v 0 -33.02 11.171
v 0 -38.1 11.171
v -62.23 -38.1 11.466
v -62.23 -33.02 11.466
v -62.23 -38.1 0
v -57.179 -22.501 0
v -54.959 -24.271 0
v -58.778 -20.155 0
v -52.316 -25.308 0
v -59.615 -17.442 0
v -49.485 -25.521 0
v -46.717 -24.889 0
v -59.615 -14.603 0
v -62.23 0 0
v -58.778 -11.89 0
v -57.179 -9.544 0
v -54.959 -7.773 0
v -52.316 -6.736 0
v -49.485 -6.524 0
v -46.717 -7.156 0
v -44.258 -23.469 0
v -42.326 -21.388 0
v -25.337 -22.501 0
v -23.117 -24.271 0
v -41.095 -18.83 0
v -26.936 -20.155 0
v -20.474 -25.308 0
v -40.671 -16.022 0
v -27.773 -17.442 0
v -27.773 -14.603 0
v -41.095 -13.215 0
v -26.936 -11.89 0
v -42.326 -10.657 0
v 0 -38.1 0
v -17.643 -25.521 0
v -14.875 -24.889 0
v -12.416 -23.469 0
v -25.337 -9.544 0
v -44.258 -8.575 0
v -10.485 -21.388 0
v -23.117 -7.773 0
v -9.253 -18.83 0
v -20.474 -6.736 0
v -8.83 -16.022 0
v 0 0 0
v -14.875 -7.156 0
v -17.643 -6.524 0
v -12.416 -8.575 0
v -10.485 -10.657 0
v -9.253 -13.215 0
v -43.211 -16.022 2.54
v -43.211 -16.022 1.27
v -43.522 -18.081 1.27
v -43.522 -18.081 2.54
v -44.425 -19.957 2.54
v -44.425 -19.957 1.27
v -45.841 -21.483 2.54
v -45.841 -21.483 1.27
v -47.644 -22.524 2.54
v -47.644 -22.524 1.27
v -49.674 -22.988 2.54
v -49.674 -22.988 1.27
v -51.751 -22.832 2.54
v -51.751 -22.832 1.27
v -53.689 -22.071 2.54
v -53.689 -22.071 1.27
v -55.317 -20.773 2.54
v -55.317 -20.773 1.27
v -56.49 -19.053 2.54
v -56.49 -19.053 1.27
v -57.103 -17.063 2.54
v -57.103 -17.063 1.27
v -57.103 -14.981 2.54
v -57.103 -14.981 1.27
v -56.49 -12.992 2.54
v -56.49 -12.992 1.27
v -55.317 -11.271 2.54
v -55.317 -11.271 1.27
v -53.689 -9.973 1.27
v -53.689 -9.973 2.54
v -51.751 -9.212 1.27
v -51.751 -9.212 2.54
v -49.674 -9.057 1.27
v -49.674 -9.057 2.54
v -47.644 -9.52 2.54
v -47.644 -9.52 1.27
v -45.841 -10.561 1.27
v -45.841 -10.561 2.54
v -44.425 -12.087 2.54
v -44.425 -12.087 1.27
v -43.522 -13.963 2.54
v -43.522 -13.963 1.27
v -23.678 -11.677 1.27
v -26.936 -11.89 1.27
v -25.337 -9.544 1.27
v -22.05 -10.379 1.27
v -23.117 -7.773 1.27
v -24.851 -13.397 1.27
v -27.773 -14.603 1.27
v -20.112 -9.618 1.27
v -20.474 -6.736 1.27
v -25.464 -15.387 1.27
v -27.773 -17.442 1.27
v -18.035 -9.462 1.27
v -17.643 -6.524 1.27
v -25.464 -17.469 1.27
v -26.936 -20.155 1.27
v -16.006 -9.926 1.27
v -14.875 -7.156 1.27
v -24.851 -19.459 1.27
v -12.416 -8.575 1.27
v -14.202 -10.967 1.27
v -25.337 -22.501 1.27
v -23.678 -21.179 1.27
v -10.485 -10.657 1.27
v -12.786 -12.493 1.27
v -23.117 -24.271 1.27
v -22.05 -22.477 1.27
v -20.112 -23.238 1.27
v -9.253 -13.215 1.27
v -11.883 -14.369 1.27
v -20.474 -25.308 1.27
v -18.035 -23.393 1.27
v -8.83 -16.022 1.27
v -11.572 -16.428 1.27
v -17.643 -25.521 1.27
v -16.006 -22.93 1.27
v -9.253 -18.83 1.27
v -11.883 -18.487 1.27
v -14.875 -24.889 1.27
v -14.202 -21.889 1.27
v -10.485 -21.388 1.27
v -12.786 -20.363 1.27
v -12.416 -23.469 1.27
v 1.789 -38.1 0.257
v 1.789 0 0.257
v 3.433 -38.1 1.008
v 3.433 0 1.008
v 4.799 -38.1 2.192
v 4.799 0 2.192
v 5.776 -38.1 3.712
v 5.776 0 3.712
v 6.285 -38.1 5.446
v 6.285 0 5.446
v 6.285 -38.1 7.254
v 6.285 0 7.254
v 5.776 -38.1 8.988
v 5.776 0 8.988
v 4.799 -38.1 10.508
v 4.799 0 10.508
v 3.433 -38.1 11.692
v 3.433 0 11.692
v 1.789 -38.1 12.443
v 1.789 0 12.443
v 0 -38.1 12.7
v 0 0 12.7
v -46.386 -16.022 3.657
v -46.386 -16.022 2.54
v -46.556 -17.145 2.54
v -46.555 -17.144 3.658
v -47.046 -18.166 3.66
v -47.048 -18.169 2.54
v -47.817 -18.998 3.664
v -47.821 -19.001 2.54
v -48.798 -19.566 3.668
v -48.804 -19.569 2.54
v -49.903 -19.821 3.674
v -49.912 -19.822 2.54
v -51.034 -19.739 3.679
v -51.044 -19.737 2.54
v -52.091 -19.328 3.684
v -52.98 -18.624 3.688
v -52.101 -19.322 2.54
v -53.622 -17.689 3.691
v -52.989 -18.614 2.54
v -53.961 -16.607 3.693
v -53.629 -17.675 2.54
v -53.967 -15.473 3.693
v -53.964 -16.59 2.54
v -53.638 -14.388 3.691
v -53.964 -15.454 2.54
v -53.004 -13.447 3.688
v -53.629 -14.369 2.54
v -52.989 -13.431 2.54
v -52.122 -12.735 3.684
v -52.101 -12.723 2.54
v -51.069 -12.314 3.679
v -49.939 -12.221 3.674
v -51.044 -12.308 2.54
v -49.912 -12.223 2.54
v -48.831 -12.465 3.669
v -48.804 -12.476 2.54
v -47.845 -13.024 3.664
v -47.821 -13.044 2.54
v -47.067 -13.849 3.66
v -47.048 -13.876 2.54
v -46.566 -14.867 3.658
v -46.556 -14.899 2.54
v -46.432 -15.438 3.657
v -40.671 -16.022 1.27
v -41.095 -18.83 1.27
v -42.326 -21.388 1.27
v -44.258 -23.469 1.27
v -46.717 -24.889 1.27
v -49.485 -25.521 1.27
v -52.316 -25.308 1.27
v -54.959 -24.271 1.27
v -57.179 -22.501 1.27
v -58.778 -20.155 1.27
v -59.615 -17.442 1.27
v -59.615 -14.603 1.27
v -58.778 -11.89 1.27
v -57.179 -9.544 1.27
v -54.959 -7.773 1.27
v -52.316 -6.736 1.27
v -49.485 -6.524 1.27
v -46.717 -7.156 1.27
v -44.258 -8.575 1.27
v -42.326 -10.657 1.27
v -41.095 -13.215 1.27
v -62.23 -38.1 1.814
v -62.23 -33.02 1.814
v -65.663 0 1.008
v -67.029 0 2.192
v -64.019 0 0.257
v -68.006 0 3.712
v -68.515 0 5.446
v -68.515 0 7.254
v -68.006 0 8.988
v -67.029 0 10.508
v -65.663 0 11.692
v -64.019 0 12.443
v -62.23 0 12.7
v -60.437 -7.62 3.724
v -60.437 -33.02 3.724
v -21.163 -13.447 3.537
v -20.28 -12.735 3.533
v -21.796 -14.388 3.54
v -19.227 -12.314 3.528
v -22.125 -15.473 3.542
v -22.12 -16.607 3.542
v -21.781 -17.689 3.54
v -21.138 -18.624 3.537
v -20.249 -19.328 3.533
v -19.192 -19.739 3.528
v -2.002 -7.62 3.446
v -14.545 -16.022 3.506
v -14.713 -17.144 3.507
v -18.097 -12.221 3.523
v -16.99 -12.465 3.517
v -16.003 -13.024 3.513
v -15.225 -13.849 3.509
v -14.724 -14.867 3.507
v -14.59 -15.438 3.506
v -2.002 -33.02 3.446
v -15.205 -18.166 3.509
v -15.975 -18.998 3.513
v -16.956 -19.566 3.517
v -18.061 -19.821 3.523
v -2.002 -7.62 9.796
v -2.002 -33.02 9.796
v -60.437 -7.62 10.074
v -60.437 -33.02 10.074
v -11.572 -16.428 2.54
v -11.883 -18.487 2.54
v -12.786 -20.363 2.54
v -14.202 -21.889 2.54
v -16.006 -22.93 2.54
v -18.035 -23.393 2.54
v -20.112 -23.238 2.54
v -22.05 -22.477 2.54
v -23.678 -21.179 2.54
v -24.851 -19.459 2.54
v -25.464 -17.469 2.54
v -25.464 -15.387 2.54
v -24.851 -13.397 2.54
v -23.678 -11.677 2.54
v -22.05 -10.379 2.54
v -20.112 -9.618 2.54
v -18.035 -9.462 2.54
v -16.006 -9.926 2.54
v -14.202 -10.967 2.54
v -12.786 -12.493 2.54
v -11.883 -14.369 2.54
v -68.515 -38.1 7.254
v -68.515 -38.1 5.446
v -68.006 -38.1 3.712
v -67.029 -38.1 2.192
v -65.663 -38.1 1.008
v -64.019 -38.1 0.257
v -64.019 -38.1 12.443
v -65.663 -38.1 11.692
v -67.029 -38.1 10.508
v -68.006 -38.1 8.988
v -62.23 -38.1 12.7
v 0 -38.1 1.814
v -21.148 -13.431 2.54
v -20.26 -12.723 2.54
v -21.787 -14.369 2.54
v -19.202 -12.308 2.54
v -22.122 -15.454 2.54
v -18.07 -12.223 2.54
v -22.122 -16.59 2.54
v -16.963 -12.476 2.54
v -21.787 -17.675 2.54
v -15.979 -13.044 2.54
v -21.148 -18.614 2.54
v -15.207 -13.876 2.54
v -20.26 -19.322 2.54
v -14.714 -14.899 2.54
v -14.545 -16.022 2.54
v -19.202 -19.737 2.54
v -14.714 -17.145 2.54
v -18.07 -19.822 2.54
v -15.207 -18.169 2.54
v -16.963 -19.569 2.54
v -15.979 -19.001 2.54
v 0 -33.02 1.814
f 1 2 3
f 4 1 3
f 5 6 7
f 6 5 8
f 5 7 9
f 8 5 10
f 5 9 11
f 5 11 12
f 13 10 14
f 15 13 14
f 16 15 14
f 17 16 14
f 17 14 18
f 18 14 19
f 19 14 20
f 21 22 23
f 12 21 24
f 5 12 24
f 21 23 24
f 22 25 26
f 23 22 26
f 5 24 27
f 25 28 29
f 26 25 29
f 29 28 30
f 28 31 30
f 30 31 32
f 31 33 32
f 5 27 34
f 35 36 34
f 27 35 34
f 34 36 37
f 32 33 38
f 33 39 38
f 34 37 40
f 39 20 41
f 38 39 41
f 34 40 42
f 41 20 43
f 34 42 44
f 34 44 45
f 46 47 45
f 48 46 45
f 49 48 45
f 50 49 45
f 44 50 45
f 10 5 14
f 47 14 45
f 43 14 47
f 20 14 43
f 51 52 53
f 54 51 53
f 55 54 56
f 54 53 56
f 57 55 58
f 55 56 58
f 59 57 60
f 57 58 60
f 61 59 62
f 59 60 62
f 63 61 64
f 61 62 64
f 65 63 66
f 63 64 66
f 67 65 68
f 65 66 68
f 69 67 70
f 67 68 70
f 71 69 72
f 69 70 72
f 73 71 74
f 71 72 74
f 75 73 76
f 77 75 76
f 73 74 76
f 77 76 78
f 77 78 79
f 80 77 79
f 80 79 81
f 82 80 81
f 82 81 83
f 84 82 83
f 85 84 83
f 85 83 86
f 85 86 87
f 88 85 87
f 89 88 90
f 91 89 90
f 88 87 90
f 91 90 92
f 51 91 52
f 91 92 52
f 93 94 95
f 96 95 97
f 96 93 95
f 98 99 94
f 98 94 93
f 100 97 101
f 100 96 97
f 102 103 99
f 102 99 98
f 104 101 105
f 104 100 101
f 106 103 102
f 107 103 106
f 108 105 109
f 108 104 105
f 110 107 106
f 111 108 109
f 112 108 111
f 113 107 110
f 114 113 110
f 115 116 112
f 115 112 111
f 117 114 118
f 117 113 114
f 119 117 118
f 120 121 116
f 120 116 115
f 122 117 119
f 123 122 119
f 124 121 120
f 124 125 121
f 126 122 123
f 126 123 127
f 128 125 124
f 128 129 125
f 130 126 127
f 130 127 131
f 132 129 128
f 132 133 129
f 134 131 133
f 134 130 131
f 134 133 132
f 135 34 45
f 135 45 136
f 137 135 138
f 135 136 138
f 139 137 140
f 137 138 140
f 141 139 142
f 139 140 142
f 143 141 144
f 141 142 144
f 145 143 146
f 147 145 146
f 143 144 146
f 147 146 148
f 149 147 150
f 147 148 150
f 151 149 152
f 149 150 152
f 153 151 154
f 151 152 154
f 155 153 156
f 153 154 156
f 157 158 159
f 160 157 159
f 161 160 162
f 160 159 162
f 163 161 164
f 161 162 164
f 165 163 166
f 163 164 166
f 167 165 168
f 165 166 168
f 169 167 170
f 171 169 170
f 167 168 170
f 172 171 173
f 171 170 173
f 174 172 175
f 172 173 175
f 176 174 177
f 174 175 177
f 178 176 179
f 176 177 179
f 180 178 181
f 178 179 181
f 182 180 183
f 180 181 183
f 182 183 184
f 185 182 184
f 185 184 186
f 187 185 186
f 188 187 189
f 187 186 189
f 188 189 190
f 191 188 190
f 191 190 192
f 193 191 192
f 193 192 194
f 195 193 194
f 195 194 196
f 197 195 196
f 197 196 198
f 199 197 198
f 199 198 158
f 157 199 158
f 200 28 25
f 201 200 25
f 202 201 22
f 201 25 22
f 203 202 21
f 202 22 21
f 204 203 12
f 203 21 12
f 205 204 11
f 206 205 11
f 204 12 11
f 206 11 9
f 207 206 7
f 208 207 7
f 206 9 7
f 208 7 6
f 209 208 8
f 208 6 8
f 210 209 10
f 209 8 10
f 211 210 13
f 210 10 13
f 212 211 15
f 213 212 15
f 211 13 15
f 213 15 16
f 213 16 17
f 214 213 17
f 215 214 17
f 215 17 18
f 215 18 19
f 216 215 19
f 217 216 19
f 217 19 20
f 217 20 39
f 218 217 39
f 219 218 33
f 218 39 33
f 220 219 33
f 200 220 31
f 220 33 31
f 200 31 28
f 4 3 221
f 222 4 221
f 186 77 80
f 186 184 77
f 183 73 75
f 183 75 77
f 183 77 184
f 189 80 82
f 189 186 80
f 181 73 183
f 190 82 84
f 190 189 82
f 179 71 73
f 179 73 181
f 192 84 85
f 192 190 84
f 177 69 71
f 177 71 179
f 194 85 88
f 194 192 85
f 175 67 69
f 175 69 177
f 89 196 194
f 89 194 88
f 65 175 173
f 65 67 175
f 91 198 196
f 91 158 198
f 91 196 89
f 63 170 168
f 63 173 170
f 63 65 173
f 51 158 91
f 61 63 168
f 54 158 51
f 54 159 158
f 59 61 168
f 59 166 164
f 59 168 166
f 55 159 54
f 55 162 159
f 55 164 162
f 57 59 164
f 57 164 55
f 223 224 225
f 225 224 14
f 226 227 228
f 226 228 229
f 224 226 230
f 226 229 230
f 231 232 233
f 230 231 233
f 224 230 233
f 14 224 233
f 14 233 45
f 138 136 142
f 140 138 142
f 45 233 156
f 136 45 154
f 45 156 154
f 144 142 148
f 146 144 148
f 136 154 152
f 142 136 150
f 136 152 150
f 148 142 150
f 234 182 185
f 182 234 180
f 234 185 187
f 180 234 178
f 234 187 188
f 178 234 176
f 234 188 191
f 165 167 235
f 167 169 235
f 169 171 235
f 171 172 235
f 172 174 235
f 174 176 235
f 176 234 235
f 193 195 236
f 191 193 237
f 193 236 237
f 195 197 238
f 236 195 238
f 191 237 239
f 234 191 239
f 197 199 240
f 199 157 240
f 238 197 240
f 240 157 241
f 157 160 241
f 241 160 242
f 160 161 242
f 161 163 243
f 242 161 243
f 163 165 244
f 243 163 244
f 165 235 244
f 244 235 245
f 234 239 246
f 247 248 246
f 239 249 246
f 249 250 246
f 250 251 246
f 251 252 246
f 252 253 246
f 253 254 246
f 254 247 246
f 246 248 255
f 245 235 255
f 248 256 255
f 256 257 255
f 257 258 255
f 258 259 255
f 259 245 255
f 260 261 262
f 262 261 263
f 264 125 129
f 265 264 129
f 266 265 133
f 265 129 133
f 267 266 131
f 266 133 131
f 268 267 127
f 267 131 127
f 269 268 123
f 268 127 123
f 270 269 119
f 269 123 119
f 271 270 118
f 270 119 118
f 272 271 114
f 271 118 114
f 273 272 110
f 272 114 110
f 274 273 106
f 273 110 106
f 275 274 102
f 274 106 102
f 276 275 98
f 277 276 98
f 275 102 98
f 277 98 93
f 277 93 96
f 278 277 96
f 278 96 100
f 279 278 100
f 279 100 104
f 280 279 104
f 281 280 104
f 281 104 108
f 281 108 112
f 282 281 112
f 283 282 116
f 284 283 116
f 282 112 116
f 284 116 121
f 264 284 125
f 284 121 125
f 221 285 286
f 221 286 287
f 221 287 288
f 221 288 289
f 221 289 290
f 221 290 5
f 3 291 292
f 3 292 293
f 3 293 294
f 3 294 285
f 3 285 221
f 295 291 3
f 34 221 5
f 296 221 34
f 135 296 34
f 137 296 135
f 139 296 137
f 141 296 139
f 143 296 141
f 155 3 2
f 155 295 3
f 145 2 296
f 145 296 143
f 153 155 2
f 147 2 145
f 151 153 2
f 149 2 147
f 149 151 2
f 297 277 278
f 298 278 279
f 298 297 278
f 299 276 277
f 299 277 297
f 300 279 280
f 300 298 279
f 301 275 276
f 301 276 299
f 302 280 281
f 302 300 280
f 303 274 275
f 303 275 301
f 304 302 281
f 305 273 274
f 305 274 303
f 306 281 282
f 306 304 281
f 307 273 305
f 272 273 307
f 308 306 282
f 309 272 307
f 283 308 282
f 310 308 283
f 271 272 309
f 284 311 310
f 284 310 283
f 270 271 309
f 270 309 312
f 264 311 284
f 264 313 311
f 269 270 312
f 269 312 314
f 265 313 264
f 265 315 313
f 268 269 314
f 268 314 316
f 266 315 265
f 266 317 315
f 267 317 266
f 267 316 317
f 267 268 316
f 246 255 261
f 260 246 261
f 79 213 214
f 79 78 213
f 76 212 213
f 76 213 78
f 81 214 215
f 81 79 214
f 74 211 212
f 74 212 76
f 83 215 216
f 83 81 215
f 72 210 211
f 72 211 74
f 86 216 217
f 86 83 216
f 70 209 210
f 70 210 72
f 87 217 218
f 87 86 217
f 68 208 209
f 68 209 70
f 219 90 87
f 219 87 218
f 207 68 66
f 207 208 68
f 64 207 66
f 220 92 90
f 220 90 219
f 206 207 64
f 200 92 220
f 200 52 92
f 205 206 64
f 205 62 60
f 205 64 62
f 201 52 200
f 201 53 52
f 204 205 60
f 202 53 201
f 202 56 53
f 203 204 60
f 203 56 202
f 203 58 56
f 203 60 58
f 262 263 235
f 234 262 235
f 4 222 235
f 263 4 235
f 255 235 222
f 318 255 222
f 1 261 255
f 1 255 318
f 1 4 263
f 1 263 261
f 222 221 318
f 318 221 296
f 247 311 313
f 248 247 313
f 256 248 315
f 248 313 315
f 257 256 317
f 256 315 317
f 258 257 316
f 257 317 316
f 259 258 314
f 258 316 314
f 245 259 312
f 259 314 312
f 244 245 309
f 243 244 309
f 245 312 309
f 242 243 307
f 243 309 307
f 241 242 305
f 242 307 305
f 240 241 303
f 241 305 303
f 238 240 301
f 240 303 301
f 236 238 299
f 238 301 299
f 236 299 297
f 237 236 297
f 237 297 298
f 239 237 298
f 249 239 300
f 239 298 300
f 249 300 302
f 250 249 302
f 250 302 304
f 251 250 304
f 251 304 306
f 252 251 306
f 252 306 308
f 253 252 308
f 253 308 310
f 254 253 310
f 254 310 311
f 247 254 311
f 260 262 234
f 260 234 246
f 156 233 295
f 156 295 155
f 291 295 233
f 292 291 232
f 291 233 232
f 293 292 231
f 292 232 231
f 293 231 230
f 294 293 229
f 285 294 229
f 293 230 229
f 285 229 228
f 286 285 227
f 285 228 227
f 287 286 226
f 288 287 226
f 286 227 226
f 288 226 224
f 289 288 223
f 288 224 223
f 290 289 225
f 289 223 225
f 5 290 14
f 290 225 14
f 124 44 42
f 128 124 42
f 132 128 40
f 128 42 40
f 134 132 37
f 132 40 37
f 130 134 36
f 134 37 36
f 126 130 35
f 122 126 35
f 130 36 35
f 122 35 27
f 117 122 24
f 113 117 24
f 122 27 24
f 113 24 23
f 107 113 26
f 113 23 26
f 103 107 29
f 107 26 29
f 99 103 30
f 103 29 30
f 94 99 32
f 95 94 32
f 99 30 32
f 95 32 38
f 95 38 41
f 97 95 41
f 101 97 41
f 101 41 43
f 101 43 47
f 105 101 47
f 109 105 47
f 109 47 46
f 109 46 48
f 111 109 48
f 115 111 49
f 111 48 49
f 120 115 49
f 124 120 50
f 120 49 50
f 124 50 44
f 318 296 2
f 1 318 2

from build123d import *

# Parameters (mm, degrees)
F0_W      = 62.23
F0_H      = 12.7
F1_DEPTH  = 38.1
F3_DEPTH  = 5.08
F5_DEPTH  = 25.4
F6_R      = 9.525
F7_DEPTH  = 1.27
F8_R      = 6.985
F9_DEPTH  = 1.27
F10_R     = 3.81
F11_DEPTH = 1.27


with BuildPart() as f1:
    # F0 (on Front) → F1 (new body)
    with BuildSketch(Plane.XZ):
        with Locations((-31.115, 6.35)):
            Rectangle(F0_W, F0_H)
        with BuildLine():
            Line((0, 12.7), (0, 0))
            ThreePointArc((0, 0), (6.35, 6.35), (0, 12.7))
        make_face()
        with BuildLine():
            ThreePointArc((-62.23, 12.7), (-68.58, 6.35), (-62.23, 0))
            Line((-62.23, 0), (-62.23, 12.7))
        make_face()
    extrude(amount=F1_DEPTH)

    # F2 (on face) → F3 (cut)
    with BuildSketch(Plane.XZ.offset(38.1)):
        Polygon((-62.23, 1.814069), (0, 1.814069), (0, 11.170847), (-62.23, 11.466069), align=None)
    extrude(amount=-F3_DEPTH, mode=Mode.SUBTRACT)

    # F4 (on face) → F5 (cut)
    with BuildSketch(Plane.XZ.offset(33.02)):
        Polygon((-60.437147, 10.073616), (-60.437147, 3.723616), (-2.002486, 3.446399), (-2.002486, 9.796399), align=None)
    extrude(amount=-F5_DEPTH, mode=Mode.SUBTRACT)

    # F6 (on face) → F7 (cut)
    with BuildSketch(Plane(origin=(0, 0, 0), x_dir=(1, 0, 0), z_dir=(0, 0, -1))):
        with Locations((-50.196387, 16.022282)):
            Circle(F6_R)
        with Locations((-18.354639, 16.022282)):
            Circle(F6_R)
    extrude(amount=-F7_DEPTH, mode=Mode.SUBTRACT)

    # F8 (on face) → F9 (cut)
    with BuildSketch(Plane(origin=(0, 0, 1.27), x_dir=(1, 0, 0), z_dir=(0, 0, -1))):
        with Locations((-50.196387, 16.022282)):
            Circle(F8_R)
        with Locations((-18.557454, 16.427908)):
            Circle(F8_R)
    extrude(amount=-F9_DEPTH, mode=Mode.SUBTRACT)

    # F10 (on face) → F11 (cut)
    with BuildSketch(Plane(origin=(0, 0, 2.54), x_dir=(1, 0, 0), z_dir=(0, 0, -1))):
        with Locations((-50.196387, 16.022282)):
            Circle(F10_R)
        with Locations((-18.354639, 16.022282)):
            Circle(F10_R)
    extrude(amount=-F11_DEPTH, mode=Mode.SUBTRACT)


solid = f1.part
